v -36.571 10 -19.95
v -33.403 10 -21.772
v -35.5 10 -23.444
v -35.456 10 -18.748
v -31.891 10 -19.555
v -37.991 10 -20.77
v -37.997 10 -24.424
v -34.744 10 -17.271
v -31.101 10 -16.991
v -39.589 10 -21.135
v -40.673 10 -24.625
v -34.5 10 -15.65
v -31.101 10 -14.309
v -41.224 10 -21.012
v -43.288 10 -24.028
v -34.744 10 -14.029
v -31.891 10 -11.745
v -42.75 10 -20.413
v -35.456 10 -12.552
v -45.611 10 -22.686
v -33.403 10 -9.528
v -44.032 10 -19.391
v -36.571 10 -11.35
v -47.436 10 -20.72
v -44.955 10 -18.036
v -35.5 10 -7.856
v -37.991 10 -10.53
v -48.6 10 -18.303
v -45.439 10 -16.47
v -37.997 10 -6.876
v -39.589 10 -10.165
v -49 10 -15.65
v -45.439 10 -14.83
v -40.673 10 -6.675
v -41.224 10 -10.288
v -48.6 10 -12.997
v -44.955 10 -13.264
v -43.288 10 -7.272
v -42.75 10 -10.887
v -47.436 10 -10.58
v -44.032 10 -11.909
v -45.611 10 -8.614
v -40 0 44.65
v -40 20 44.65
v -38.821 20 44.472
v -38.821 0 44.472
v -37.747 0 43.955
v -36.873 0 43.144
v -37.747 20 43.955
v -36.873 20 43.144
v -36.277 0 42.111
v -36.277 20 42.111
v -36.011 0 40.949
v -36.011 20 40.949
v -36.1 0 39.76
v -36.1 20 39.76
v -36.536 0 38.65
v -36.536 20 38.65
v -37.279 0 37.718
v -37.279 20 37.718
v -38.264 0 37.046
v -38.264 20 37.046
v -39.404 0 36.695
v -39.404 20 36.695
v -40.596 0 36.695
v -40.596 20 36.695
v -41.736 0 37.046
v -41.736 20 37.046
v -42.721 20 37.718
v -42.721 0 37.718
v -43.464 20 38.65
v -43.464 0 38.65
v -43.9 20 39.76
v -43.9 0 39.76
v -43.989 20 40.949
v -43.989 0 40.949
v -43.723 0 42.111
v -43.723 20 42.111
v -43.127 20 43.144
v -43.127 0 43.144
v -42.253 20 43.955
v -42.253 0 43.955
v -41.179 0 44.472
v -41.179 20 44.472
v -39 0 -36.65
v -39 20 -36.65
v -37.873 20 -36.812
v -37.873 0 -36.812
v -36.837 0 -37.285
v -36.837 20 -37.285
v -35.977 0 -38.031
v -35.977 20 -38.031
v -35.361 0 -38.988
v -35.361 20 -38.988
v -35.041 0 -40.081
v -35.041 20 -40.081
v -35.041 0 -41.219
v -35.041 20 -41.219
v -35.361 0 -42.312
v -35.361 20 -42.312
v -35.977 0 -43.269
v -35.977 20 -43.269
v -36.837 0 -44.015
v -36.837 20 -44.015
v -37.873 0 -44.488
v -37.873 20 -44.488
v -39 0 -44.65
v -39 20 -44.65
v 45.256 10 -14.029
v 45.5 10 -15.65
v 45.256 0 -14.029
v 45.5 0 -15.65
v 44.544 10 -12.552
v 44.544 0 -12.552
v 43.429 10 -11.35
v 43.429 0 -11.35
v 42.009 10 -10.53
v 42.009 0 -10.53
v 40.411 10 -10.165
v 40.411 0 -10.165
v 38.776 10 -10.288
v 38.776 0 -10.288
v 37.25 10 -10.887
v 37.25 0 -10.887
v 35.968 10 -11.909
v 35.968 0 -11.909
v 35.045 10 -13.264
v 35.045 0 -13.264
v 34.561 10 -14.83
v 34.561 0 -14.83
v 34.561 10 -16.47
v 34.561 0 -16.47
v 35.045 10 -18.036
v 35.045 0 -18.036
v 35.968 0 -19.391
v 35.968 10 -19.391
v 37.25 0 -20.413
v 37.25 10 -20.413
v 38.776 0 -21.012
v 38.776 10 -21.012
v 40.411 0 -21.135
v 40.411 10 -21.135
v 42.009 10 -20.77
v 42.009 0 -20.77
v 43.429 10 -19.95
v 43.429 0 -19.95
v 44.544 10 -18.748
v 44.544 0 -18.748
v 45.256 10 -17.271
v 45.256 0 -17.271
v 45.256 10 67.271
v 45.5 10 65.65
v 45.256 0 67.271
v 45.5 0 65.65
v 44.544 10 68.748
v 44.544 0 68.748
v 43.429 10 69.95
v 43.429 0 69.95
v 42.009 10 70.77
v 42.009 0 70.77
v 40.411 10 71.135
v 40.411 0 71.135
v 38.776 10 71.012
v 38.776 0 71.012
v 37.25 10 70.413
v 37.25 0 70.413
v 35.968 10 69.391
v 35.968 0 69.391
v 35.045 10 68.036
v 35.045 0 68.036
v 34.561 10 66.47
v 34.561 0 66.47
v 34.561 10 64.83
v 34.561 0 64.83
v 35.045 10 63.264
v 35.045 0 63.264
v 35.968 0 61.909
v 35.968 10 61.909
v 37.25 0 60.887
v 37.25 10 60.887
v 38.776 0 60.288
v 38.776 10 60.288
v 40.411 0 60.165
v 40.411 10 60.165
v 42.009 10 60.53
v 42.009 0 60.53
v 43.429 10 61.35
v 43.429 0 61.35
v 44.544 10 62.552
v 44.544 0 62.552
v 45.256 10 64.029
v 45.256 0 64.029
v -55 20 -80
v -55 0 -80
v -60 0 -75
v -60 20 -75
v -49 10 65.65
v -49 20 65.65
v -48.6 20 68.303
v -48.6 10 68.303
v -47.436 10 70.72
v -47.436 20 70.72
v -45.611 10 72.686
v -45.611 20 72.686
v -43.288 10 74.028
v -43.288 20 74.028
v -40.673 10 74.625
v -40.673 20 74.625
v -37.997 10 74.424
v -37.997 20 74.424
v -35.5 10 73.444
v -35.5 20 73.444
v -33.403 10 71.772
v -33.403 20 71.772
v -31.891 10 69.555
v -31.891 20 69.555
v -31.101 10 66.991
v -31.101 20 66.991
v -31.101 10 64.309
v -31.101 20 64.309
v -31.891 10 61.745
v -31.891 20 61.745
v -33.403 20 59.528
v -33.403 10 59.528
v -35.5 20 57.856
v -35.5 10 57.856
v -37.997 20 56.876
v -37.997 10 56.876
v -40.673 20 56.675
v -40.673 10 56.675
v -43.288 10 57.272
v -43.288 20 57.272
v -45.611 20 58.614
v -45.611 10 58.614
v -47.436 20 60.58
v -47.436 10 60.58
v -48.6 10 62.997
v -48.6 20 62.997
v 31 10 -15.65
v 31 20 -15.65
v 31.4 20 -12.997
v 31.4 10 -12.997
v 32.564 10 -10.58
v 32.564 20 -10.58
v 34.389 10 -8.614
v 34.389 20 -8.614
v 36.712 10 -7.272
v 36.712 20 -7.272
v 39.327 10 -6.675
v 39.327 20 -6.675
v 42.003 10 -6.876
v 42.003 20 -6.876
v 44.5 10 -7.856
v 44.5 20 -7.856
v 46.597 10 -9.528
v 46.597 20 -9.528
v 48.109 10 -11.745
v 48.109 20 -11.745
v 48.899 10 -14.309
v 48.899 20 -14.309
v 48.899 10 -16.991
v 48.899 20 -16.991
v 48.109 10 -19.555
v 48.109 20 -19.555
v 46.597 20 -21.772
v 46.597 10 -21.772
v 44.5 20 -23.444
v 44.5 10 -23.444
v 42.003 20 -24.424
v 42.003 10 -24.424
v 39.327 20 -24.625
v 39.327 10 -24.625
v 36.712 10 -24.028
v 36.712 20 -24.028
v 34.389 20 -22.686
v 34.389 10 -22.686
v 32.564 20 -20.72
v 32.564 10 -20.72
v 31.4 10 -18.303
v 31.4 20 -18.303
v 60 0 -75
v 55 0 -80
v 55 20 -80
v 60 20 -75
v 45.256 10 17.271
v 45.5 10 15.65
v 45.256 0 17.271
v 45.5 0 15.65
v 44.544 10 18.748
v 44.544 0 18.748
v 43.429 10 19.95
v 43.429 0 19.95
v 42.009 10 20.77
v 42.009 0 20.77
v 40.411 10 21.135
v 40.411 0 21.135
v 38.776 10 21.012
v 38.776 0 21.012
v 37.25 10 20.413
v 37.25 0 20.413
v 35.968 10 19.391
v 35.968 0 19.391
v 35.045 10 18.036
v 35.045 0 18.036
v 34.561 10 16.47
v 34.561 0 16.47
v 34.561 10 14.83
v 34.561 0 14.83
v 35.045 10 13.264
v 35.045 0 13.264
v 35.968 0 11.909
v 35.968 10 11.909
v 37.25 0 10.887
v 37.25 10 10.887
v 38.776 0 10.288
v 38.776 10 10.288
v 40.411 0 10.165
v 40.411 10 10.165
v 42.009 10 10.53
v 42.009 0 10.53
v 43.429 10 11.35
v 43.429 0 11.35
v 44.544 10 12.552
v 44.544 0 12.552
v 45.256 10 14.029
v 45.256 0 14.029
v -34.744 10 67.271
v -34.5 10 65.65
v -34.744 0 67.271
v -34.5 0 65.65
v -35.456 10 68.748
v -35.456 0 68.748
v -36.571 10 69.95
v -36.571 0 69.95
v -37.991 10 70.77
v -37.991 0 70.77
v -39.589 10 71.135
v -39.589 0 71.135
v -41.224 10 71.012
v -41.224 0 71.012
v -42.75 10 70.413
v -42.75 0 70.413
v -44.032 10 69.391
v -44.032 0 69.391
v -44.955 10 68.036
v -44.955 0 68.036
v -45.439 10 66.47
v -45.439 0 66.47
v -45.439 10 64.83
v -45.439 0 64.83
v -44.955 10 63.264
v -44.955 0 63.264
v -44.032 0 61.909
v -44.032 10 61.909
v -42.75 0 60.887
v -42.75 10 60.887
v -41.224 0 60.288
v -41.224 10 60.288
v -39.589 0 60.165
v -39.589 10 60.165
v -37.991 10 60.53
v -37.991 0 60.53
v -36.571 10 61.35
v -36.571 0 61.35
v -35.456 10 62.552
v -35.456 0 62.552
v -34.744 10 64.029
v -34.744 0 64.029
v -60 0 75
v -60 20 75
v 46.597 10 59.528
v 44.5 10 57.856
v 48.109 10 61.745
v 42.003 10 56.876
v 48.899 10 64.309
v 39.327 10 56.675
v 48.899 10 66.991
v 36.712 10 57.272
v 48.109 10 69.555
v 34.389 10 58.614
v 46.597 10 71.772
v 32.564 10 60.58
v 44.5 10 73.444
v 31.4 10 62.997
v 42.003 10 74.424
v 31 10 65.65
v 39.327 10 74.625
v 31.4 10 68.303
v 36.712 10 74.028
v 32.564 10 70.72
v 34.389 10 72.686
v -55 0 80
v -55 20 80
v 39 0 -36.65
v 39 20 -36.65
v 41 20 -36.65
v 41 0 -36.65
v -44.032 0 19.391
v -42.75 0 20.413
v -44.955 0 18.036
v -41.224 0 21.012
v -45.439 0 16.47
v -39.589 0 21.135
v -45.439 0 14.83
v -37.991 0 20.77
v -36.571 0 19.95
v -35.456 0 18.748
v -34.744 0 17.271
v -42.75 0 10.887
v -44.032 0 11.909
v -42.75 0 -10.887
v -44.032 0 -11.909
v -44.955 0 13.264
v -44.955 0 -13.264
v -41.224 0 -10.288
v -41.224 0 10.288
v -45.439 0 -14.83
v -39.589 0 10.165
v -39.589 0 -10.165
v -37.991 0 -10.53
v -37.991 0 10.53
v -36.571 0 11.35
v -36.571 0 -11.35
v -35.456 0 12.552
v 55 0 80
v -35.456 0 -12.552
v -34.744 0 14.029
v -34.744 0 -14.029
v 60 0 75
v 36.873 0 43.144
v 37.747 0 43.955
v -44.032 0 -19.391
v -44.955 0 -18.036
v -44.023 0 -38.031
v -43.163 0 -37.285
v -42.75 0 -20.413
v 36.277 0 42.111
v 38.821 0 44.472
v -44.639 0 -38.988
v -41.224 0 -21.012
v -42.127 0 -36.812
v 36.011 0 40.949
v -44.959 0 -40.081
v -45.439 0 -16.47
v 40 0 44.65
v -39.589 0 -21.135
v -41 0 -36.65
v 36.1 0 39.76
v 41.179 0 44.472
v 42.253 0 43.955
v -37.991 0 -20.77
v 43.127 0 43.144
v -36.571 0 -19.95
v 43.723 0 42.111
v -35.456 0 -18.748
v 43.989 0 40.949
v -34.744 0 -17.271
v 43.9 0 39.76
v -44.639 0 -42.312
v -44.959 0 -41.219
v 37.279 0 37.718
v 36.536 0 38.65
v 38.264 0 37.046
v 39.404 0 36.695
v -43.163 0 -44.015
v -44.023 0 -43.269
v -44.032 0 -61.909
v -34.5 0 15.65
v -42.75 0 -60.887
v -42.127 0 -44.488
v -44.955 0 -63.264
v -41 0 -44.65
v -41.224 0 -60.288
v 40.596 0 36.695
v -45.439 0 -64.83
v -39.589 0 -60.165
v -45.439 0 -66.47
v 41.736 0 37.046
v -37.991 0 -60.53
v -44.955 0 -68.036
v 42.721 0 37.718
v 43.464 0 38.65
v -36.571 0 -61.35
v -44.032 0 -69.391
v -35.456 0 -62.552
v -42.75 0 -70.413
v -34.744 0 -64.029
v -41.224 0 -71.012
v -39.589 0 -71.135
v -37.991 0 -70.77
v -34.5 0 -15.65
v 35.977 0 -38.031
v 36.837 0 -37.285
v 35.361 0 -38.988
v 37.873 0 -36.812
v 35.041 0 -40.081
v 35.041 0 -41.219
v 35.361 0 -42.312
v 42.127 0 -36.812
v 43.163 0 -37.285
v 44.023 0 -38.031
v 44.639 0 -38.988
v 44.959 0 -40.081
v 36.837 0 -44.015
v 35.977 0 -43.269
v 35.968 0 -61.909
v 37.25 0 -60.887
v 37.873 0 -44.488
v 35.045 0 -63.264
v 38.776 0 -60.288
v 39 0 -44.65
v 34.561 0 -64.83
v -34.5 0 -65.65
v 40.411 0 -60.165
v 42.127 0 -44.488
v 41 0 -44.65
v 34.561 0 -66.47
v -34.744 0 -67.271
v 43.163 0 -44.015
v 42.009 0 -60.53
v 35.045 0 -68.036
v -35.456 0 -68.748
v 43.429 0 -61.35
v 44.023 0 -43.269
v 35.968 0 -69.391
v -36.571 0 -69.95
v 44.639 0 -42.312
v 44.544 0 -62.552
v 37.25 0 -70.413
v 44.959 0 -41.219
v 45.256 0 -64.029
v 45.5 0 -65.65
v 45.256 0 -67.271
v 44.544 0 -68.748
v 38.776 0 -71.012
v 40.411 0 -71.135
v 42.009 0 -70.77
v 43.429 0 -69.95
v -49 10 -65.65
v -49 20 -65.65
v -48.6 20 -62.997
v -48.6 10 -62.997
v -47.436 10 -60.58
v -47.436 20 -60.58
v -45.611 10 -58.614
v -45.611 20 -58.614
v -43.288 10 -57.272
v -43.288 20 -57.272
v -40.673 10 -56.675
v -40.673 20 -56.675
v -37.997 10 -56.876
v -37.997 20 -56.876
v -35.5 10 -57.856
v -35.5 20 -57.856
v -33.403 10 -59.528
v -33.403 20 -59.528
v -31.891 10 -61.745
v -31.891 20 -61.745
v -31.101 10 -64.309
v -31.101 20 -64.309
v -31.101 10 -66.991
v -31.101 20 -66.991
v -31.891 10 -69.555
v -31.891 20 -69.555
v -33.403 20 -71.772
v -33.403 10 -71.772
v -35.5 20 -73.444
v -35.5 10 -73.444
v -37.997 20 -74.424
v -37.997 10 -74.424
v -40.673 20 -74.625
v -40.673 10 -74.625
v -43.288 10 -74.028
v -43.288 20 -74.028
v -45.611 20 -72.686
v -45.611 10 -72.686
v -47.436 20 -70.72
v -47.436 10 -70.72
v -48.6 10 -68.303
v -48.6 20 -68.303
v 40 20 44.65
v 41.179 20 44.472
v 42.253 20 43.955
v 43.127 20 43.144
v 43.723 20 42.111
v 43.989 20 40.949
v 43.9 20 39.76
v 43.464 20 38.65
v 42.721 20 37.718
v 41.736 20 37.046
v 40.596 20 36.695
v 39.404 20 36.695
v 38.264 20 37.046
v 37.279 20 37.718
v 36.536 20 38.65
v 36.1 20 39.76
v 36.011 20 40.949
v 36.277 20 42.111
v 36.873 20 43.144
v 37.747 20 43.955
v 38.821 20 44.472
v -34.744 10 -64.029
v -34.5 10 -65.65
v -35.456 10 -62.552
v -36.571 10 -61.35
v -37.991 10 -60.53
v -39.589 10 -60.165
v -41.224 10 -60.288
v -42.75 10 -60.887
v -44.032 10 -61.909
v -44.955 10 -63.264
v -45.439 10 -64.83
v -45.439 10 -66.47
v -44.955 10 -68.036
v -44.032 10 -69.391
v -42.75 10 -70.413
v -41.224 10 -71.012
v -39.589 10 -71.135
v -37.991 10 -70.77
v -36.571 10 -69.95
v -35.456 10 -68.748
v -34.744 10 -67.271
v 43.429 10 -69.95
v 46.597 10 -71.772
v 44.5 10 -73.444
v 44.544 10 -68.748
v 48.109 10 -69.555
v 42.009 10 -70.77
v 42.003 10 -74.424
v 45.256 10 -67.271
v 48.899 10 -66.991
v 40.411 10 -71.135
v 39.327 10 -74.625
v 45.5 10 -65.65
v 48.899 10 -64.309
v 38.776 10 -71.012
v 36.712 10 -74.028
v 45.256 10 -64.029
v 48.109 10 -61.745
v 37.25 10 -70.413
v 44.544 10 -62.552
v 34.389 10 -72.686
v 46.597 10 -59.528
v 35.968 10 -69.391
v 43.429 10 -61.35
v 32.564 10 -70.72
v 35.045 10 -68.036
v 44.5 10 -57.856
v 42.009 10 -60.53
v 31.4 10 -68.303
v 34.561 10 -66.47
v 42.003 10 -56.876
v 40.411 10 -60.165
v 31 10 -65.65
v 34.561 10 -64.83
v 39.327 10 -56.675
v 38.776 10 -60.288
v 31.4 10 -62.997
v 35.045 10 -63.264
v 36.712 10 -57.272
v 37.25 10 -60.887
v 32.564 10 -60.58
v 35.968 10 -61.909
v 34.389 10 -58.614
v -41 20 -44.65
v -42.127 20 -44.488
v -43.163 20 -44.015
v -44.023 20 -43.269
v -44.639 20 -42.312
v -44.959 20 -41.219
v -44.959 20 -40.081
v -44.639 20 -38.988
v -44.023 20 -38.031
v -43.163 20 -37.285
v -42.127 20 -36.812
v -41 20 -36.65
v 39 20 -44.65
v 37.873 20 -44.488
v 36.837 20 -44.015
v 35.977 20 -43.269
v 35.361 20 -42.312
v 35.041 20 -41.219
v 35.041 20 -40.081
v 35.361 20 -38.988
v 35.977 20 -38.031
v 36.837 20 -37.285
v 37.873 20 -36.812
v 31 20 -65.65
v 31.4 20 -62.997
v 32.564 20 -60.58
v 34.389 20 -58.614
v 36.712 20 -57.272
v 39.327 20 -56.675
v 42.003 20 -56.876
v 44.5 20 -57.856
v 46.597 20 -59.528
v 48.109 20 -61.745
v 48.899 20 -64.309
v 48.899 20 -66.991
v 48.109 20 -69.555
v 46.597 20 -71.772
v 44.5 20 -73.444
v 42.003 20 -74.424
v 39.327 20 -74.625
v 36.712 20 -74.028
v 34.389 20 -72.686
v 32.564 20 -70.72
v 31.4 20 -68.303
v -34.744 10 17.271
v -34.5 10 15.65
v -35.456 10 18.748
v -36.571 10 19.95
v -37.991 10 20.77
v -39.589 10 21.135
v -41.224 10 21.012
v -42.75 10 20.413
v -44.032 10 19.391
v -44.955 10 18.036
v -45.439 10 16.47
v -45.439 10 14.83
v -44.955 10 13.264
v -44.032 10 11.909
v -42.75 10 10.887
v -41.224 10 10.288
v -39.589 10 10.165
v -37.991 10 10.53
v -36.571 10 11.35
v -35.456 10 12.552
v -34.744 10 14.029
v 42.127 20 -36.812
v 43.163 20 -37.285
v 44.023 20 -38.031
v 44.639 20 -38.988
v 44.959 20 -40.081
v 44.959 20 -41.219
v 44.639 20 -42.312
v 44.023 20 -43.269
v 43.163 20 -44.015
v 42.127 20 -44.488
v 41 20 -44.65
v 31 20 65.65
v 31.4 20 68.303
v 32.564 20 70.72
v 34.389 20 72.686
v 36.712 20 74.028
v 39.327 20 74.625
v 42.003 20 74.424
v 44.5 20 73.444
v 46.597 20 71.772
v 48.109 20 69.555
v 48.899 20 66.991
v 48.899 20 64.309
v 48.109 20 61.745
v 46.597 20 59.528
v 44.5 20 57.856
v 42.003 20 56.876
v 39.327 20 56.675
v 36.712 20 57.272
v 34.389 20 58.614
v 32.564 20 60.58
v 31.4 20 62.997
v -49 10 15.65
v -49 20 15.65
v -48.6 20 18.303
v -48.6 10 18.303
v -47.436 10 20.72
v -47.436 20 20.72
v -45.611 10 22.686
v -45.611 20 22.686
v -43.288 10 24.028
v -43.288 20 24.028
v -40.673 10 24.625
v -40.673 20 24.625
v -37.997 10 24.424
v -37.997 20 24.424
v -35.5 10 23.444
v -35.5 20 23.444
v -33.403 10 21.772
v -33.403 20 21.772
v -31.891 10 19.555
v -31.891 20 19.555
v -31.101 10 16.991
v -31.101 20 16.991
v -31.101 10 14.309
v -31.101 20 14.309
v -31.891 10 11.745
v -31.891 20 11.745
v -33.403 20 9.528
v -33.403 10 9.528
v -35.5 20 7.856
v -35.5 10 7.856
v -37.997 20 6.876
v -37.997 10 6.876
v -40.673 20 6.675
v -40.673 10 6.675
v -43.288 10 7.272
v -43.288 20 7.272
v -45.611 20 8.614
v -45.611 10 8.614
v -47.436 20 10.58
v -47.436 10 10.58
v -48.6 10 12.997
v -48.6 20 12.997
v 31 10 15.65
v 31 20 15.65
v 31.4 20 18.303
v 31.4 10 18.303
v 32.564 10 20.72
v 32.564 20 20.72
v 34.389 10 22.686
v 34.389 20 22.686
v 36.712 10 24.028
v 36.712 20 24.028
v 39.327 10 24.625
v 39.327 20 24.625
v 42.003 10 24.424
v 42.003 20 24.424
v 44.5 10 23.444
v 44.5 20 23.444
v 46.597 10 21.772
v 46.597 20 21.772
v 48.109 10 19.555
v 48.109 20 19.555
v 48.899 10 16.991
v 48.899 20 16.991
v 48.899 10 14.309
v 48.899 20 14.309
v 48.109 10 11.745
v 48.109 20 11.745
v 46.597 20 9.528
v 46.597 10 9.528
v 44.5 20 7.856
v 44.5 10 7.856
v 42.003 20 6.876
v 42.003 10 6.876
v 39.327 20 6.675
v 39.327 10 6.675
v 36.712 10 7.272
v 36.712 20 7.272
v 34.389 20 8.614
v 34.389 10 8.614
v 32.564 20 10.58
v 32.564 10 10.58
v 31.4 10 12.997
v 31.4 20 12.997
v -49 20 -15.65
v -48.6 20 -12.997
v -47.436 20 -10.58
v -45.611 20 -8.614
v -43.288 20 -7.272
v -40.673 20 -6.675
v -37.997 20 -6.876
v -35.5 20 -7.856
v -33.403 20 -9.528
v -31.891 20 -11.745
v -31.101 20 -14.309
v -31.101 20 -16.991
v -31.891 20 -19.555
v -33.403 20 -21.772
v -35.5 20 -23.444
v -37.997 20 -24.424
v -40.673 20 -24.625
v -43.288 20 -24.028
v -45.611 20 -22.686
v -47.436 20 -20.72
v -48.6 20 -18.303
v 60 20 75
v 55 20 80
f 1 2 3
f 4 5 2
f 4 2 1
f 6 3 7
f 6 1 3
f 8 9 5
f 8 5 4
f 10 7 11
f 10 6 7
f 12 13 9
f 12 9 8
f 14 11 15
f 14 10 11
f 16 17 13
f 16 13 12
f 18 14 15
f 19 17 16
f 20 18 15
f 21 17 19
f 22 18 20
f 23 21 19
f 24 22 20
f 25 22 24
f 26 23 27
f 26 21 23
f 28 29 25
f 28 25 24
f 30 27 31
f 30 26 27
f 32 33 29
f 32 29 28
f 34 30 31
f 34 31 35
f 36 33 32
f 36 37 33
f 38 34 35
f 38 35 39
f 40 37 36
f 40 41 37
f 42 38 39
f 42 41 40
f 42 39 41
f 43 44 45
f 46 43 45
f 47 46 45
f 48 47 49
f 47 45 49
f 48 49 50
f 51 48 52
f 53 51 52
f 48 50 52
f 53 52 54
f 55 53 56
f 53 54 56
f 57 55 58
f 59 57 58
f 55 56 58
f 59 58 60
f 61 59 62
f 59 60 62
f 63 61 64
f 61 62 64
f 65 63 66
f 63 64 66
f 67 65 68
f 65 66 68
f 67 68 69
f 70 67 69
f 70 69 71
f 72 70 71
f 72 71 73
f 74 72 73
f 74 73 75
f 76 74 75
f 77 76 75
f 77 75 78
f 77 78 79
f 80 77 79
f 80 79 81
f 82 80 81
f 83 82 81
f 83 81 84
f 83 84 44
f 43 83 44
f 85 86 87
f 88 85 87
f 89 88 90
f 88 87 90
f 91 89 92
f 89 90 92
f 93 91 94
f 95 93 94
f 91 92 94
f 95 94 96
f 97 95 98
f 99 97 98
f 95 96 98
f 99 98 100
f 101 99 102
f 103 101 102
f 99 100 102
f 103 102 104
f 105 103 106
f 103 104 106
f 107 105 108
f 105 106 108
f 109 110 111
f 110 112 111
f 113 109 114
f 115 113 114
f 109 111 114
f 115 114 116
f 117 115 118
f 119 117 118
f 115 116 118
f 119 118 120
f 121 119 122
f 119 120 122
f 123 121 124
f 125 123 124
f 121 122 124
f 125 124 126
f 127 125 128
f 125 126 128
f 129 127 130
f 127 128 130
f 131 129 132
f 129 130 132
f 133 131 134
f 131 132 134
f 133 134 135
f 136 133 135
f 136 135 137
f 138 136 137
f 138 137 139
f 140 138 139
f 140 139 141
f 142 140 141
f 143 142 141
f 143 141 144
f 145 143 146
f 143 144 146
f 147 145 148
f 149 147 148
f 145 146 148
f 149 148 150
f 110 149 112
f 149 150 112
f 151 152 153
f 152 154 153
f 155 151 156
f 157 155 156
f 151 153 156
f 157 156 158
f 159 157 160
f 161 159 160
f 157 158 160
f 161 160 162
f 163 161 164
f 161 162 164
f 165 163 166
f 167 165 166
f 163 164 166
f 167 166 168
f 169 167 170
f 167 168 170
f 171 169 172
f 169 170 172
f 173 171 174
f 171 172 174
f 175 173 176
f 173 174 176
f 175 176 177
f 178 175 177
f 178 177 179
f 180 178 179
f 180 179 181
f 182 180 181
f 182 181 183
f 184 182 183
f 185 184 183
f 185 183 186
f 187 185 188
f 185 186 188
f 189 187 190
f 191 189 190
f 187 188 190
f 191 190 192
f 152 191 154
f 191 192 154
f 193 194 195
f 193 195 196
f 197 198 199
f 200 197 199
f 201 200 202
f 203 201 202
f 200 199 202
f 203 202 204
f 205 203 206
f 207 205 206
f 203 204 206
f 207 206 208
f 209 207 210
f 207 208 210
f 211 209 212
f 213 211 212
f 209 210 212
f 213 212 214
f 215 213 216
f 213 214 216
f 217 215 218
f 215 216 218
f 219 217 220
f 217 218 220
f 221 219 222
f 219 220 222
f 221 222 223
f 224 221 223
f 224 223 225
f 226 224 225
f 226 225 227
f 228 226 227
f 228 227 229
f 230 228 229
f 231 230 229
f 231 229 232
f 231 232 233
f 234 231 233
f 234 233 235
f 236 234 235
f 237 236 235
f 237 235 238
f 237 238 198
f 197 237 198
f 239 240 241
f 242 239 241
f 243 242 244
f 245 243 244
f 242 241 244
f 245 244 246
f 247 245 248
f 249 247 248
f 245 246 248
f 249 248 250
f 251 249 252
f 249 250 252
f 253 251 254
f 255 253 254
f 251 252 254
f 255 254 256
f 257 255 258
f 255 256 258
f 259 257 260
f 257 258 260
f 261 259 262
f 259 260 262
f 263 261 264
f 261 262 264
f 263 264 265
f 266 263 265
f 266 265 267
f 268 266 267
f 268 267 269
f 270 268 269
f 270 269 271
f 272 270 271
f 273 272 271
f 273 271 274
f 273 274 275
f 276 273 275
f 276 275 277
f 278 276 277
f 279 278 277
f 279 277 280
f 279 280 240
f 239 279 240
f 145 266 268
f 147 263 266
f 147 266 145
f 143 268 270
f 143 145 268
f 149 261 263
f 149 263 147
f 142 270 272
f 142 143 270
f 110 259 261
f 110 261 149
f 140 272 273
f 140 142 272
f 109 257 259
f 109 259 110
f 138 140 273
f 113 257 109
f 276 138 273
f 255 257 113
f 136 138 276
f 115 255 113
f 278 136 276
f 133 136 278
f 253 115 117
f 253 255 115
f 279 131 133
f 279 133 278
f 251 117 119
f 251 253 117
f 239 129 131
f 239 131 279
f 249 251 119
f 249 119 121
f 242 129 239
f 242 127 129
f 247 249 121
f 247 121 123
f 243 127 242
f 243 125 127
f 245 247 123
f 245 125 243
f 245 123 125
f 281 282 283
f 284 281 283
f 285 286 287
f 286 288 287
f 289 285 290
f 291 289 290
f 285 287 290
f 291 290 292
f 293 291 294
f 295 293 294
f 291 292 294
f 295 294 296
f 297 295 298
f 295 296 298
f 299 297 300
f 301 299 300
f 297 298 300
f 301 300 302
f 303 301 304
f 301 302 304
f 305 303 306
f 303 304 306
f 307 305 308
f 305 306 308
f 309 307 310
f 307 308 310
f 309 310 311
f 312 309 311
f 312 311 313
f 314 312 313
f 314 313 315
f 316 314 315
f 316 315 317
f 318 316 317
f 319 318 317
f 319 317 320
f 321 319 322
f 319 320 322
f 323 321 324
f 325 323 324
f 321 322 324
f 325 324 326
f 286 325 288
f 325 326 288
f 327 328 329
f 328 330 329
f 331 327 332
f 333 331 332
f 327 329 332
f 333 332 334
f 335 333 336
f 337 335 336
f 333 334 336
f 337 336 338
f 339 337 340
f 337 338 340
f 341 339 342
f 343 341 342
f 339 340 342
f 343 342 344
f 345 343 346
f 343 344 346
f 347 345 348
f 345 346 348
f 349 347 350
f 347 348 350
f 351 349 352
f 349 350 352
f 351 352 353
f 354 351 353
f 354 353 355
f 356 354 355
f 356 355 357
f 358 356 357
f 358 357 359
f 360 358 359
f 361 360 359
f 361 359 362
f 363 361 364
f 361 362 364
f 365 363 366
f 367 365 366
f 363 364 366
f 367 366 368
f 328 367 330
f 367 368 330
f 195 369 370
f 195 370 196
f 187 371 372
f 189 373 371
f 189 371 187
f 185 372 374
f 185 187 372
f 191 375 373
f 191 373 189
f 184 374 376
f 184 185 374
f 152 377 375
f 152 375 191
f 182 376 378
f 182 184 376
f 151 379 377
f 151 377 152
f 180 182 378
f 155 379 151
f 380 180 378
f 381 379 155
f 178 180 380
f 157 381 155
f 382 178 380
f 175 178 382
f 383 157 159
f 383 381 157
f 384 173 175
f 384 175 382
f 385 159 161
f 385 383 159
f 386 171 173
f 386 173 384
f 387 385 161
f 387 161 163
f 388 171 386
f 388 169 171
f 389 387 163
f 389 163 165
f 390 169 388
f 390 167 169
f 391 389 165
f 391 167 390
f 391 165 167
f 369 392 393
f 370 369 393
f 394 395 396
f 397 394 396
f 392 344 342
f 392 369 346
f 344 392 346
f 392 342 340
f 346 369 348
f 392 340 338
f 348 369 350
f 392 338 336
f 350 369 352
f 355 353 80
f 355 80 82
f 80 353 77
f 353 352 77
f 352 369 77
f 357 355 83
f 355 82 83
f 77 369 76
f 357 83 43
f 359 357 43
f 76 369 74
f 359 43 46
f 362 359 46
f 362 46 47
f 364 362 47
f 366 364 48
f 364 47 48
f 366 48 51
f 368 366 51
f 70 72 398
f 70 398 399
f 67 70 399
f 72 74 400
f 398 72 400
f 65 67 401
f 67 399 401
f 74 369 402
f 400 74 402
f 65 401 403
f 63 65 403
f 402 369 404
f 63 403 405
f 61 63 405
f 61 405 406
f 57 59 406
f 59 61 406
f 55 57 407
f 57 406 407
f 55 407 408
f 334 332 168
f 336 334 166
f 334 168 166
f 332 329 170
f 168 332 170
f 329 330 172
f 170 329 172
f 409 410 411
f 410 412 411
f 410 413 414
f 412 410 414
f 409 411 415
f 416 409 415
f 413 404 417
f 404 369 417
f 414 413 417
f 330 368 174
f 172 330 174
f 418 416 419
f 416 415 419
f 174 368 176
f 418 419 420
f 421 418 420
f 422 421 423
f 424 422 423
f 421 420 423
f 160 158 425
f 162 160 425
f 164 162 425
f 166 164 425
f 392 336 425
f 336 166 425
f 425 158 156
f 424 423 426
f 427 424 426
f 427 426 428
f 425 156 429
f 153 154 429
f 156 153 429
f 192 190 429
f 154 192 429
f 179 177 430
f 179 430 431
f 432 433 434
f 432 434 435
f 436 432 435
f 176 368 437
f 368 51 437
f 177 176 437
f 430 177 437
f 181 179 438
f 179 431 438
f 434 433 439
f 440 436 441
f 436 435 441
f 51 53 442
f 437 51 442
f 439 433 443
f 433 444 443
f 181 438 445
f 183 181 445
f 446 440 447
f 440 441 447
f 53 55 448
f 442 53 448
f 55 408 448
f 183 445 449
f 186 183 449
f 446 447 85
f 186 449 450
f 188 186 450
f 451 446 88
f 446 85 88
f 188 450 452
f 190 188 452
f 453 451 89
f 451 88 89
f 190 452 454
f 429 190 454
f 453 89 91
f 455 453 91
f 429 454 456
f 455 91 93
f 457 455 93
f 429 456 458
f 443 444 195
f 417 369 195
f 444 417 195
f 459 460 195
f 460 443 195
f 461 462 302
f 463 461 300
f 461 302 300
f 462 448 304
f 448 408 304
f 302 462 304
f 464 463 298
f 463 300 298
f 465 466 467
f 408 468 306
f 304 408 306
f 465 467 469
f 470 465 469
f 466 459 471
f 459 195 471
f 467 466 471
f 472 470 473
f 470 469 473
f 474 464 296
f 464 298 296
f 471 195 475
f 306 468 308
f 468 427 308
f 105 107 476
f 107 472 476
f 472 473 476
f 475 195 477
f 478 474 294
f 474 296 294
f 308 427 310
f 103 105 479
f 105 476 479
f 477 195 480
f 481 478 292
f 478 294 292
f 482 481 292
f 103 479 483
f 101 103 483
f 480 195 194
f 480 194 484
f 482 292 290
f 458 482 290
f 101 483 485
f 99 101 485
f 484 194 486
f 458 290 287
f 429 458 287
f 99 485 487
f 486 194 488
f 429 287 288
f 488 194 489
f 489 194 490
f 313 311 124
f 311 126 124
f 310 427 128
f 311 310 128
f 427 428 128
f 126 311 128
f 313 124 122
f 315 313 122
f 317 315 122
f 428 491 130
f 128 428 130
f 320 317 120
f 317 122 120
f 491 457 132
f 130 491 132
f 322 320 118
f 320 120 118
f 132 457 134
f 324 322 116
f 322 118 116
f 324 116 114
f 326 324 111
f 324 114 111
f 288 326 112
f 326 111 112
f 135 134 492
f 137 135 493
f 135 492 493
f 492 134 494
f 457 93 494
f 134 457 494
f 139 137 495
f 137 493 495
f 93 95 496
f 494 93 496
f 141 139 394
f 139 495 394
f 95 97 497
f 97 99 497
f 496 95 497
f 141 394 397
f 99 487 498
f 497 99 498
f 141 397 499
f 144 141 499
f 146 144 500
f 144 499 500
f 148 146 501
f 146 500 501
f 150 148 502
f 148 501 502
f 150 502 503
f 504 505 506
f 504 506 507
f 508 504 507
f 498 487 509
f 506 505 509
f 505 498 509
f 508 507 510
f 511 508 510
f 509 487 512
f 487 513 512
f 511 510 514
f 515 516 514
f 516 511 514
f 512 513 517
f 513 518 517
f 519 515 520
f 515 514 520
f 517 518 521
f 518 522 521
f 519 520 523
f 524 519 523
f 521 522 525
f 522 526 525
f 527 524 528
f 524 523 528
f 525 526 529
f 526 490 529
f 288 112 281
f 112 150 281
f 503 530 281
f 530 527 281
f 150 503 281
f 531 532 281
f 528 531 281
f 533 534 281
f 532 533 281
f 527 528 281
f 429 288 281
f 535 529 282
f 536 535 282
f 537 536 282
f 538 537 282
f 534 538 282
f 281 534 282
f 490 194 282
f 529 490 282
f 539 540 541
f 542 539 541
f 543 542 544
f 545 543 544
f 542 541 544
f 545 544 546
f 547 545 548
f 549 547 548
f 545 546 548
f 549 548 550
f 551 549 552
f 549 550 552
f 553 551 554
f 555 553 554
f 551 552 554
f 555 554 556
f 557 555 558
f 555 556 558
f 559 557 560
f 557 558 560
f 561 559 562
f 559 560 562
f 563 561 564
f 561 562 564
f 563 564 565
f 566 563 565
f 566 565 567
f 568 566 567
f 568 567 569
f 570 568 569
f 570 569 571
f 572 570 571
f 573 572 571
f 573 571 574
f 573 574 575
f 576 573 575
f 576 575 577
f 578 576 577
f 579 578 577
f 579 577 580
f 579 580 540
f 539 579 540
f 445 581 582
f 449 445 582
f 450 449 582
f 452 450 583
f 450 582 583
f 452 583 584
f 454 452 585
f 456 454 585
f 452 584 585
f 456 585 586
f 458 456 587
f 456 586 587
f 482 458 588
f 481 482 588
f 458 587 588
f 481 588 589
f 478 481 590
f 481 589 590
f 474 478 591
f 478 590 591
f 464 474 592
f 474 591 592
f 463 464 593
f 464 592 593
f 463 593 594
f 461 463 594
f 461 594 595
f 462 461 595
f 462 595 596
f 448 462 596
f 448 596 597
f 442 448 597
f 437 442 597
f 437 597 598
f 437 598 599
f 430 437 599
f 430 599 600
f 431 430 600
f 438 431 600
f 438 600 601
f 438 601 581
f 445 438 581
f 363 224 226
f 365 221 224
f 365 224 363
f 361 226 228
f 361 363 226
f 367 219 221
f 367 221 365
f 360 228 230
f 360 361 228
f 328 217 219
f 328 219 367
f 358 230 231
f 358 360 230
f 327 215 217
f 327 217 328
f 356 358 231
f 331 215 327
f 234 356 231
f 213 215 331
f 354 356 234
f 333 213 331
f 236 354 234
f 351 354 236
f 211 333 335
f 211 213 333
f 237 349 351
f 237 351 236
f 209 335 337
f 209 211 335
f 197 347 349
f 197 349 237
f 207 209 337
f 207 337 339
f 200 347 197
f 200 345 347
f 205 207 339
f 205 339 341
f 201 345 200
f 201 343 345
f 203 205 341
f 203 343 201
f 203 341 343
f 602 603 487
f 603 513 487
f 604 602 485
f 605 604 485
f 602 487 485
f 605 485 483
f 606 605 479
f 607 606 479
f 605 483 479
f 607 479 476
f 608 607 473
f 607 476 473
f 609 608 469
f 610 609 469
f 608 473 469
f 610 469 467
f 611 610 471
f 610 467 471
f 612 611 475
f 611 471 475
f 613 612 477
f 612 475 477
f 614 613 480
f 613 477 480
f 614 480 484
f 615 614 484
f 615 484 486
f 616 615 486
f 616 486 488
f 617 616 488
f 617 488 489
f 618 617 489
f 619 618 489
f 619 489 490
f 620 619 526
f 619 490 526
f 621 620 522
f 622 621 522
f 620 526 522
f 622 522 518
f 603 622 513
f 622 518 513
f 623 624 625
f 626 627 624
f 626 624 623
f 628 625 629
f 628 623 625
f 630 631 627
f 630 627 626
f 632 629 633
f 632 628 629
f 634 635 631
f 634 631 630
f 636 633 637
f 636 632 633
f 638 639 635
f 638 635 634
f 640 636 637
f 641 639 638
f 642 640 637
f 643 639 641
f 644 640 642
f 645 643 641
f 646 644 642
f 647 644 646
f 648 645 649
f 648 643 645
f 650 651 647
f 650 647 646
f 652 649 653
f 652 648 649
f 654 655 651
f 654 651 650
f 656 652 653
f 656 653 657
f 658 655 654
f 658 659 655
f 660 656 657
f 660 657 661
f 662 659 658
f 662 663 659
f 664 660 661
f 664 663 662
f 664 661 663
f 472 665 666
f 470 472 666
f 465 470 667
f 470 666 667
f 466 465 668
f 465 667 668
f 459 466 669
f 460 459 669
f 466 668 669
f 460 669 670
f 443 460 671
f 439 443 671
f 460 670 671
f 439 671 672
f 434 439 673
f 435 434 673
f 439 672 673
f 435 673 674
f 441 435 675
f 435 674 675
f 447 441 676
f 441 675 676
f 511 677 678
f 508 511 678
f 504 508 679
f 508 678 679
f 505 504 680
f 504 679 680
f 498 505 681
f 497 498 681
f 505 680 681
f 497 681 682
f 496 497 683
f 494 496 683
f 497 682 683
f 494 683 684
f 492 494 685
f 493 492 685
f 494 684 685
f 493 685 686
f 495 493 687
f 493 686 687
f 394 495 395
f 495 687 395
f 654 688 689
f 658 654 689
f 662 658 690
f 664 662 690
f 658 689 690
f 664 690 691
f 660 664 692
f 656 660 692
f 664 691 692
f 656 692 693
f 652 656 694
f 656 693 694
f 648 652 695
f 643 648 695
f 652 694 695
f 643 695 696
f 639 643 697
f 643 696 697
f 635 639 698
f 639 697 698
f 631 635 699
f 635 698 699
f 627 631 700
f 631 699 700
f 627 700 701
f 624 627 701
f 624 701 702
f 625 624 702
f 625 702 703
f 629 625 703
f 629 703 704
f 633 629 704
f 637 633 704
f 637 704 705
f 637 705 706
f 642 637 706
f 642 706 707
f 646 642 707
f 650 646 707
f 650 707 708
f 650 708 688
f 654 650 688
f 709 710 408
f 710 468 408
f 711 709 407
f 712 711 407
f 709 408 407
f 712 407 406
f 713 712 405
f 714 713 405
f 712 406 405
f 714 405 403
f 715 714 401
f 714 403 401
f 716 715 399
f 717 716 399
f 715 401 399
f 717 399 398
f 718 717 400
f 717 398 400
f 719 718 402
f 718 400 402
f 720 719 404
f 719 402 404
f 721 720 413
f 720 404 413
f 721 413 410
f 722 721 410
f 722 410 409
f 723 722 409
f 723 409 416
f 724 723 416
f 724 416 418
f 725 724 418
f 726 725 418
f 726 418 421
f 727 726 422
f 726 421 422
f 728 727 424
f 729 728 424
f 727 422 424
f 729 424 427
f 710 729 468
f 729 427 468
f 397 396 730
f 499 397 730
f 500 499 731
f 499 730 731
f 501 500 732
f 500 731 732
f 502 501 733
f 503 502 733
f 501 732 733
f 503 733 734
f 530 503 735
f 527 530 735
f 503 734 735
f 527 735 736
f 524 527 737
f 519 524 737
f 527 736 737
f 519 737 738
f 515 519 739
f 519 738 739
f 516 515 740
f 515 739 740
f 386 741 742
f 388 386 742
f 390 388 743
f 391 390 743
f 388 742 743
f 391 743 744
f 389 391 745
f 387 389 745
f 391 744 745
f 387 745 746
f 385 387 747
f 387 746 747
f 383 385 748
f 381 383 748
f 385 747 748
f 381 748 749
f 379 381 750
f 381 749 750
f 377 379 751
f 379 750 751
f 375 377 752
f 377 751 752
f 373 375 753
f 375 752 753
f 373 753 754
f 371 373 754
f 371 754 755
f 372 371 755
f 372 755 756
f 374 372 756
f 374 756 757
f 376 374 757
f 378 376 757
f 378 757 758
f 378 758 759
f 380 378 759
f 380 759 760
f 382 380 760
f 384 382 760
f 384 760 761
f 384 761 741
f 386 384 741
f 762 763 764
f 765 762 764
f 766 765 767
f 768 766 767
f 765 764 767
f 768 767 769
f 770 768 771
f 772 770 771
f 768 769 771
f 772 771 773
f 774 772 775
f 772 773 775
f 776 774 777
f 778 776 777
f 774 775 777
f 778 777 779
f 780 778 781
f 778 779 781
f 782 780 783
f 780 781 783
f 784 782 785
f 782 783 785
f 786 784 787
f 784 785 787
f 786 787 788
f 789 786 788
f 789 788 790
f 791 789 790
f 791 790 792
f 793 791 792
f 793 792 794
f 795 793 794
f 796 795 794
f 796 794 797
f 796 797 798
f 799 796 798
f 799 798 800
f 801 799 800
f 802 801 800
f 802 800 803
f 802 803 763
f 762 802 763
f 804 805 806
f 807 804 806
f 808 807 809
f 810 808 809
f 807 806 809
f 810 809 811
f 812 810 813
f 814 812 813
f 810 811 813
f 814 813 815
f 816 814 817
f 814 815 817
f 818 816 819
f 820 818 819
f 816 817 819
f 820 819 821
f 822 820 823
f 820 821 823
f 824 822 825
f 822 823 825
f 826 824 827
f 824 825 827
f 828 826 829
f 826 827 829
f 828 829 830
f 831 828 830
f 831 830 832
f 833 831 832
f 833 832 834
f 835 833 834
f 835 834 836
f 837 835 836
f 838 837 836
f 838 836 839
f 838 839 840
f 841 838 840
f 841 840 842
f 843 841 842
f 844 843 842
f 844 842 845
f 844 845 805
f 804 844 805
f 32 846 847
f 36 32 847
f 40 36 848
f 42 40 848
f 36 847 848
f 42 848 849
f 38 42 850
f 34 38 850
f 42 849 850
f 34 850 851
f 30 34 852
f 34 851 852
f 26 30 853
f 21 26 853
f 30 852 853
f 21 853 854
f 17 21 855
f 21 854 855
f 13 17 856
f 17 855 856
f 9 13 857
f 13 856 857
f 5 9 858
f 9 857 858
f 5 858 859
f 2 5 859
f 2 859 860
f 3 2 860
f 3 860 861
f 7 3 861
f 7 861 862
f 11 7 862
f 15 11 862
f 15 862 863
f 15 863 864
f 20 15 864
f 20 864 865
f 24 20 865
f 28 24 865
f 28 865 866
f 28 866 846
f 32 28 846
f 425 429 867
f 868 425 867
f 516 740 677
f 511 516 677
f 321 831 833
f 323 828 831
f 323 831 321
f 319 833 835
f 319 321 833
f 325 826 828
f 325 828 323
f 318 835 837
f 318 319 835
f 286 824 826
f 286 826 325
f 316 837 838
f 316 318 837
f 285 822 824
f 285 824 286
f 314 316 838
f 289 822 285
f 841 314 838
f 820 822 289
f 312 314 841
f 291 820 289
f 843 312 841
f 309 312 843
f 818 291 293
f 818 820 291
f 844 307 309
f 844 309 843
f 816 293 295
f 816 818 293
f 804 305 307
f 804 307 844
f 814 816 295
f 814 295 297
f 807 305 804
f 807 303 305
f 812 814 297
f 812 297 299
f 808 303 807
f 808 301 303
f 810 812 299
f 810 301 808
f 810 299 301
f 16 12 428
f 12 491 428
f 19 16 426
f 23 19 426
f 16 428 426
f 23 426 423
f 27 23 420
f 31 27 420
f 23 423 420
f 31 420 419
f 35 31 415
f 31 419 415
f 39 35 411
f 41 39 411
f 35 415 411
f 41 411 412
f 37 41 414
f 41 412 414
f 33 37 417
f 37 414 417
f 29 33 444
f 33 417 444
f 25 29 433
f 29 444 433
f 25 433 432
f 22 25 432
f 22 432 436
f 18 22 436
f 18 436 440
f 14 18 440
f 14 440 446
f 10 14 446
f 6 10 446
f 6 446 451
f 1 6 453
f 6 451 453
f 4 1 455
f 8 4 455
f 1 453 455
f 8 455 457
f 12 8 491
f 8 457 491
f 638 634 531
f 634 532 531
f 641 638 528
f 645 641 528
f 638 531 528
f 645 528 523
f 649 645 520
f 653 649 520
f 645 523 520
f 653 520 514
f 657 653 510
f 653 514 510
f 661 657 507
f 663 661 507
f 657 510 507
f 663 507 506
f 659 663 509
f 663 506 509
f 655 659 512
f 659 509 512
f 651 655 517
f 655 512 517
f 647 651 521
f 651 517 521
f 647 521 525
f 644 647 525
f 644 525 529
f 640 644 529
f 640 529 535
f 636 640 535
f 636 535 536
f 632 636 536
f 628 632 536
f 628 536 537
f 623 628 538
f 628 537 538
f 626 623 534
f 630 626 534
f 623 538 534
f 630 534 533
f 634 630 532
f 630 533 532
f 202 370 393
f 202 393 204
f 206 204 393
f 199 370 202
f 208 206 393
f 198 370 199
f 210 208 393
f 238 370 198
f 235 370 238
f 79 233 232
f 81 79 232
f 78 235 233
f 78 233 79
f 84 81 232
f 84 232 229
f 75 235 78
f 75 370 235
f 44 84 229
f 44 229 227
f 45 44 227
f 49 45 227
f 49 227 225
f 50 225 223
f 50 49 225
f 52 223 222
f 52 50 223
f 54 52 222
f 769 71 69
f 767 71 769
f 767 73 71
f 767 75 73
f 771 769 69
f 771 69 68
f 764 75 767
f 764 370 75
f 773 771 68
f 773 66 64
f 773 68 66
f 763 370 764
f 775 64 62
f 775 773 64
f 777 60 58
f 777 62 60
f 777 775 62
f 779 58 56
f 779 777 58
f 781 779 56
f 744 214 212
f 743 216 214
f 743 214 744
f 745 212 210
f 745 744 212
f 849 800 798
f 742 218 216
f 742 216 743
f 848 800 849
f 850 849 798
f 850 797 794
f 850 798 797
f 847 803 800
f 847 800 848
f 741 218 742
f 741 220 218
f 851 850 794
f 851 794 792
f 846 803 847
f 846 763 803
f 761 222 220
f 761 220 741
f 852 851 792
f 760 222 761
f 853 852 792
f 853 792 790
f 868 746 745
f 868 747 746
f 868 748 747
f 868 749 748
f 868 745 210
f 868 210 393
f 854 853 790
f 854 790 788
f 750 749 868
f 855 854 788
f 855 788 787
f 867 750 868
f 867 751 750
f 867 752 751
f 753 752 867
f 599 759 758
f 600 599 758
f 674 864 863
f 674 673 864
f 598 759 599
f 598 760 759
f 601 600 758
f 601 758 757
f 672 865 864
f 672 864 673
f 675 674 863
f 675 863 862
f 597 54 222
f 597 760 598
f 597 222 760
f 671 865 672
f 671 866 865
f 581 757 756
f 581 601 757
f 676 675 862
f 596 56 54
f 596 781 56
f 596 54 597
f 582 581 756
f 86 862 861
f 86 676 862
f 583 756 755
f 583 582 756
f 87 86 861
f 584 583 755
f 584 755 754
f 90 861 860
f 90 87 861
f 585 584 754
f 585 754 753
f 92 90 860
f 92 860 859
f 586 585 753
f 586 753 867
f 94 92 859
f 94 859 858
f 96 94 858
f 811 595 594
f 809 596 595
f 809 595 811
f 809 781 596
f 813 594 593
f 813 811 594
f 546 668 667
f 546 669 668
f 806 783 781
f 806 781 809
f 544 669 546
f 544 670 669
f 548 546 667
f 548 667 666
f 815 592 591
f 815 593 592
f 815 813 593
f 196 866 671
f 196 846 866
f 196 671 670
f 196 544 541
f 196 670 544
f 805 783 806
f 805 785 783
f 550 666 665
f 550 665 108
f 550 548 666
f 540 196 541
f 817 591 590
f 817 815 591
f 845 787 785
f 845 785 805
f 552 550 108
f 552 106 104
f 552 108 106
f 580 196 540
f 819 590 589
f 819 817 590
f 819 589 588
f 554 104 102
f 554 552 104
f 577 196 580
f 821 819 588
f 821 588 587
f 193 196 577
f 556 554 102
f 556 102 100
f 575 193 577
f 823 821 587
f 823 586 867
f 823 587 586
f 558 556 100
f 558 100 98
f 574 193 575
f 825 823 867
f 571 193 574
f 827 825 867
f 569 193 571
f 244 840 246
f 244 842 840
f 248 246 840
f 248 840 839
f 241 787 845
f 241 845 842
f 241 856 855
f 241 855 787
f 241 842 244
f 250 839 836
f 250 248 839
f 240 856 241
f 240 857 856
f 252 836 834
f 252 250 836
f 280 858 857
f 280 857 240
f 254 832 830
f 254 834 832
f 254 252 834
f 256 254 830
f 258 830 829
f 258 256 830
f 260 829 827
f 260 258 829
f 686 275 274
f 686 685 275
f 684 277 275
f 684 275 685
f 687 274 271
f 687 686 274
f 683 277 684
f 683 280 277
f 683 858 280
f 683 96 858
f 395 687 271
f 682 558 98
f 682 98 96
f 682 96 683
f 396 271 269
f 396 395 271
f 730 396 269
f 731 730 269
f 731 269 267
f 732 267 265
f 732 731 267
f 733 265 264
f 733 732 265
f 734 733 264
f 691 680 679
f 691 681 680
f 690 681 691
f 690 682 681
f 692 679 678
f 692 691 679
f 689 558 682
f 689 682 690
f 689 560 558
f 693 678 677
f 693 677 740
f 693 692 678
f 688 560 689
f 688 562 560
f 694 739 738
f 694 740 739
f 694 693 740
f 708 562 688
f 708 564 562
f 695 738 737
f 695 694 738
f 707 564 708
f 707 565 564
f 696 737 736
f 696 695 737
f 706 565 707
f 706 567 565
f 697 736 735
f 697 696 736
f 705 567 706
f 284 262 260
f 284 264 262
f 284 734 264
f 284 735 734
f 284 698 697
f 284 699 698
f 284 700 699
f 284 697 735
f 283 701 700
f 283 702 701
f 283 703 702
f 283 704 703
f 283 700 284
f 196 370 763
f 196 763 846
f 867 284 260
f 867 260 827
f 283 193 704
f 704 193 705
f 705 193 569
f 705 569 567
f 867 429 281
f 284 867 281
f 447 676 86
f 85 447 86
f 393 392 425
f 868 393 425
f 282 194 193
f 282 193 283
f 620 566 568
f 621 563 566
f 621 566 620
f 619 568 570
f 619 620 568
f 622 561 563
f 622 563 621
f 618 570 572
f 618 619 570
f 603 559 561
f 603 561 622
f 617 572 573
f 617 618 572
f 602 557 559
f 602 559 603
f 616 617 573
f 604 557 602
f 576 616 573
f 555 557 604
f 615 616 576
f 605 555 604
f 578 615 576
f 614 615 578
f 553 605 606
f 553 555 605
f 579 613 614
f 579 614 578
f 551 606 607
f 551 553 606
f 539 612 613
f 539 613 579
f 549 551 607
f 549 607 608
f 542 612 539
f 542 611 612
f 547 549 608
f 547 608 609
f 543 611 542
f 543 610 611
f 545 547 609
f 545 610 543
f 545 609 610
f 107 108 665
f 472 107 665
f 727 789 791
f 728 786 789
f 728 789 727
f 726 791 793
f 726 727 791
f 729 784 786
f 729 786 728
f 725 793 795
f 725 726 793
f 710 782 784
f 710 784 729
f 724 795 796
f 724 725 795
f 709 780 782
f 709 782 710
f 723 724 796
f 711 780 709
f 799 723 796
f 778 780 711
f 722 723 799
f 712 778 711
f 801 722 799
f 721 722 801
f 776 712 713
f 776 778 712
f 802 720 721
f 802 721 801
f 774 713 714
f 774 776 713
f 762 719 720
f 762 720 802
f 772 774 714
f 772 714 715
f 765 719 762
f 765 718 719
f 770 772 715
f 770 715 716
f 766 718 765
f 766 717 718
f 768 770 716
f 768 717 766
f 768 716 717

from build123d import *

# Parameters (mm, degrees)
SKETCH_1_W                    = 120
SKETCH_1_H                    = 160
EXTRUDE_1_DEPTH               = 20
CHAMFER_1_SIZE                = 5
HOLE_WIZARD_M10_1_D           = 11
HOLE_WIZARD_M10_1_CBORE_D     = 18
HOLE_WIZARD_M10_1_CBORE_DEPTH = 10
CUT_EXTRUDE_1_REACH           = 103.98
SKETCH_6_R                    = 4


with BuildPart() as part:
    # 草圖1 → 伸長1 (new body)
    with BuildSketch(Plane(origin=(0, 0, 0), x_dir=(1, 0, 0), z_dir=(0, 1, 0))):
        Rectangle(SKETCH_1_W, SKETCH_1_H)
    extrude(amount=EXTRUDE_1_DEPTH)

    # 導角1
    chamfer_1_edges = [part.edges().sort_by_distance(p)[0] for p in [
        (-60, 10, -80),
        (60, 10, -80),
        (60, 10, 80),
        (-60, 10, 80),
    ]]
    chamfer(chamfer_1_edges, length=CHAMFER_1_SIZE)

    # M10 六角承窩頭蓋螺釘的柱孔1 (through all)
    with Locations(Plane(origin=(0, 20, 0), x_dir=(-1, 0, 0), z_dir=(0, 1, 0))):
        with Locations((40, -65.65), (40, -15.65), (40, 15.65), (40, 65.65), (-40, -65.65), (-40, -15.65), (-40, 15.65), (-40, 65.65)):
            CounterBoreHole(HOLE_WIZARD_M10_1_D / 2, HOLE_WIZARD_M10_1_CBORE_D / 2, HOLE_WIZARD_M10_1_CBORE_DEPTH)

    # 草圖6 → 除料-伸長1 (cut, up to next)
    with BuildSketch(Plane(origin=(0, 20, 0), x_dir=(1, 0, 0), z_dir=(0, 1, 0)), mode=Mode.PRIVATE) as cut_extrude_1_sk1:
        with Locations(Location((40, -40.65, 0), (0, 0, 270))):
            Circle(SKETCH_6_R)
    cut_extrude_1_tool1 = extrude(cut_extrude_1_sk1.sketch, amount=-CUT_EXTRUDE_1_REACH, mode=Mode.PRIVATE) & part.part
    # 草圖6 → 除料-伸長1 (cut, up to next)
    with BuildSketch(Plane(origin=(0, 20, 0), x_dir=(1, 0, 0), z_dir=(0, 1, 0)), mode=Mode.PRIVATE) as cut_extrude_1_sk2:
        with Locations(Location((-40, -40.65, 0), (0, 0, 270))):
            Circle(SKETCH_6_R)
    cut_extrude_1_tool2 = extrude(cut_extrude_1_sk2.sketch, amount=-CUT_EXTRUDE_1_REACH, mode=Mode.PRIVATE) & part.part
    # 草圖6 → 除料-伸長1 (cut, up to next)
    with BuildSketch(Plane(origin=(0, 20, 0), x_dir=(1, 0, 0), z_dir=(0, 1, 0)), mode=Mode.PRIVATE) as cut_extrude_1_sk3:
        with BuildLine():
            Line((39, 36.65), (41, 36.65))
            ThreePointArc((41, 36.65), (45, 40.65), (41, 44.65))
            Line((41, 44.65), (39, 44.65))
            ThreePointArc((39, 44.65), (35, 40.65), (39, 36.65))
        make_face()
    cut_extrude_1_tool3 = extrude(cut_extrude_1_sk3.sketch, amount=-CUT_EXTRUDE_1_REACH, mode=Mode.PRIVATE) & part.part
    # 草圖6 → 除料-伸長1 (cut, up to next)
    with BuildSketch(Plane(origin=(0, 20, 0), x_dir=(1, 0, 0), z_dir=(0, 1, 0)), mode=Mode.PRIVATE) as cut_extrude_1_sk4:
        with BuildLine():
            Line((-41, 36.65), (-39, 36.65))
            ThreePointArc((-39, 36.65), (-35, 40.65), (-39, 44.65))
            Line((-39, 44.65), (-41, 44.65))
            ThreePointArc((-41, 44.65), (-45, 40.65), (-41, 36.65))
        make_face()
    cut_extrude_1_tool4 = extrude(cut_extrude_1_sk4.sketch, amount=-CUT_EXTRUDE_1_REACH, mode=Mode.PRIVATE) & part.part
    add(cut_extrude_1_tool1.solids().sort_by_distance((40, 20, 40.65))[0], mode=Mode.SUBTRACT)
    add(cut_extrude_1_tool2.solids().sort_by_distance((-40, 20, 40.65))[0], mode=Mode.SUBTRACT)
    add(cut_extrude_1_tool3.solids().sort_by_distance((40, 20, -40.65))[0], mode=Mode.SUBTRACT)
    add(cut_extrude_1_tool4.solids().sort_by_distance((-40, 20, -40.65))[0], mode=Mode.SUBTRACT)


solid = part.part
